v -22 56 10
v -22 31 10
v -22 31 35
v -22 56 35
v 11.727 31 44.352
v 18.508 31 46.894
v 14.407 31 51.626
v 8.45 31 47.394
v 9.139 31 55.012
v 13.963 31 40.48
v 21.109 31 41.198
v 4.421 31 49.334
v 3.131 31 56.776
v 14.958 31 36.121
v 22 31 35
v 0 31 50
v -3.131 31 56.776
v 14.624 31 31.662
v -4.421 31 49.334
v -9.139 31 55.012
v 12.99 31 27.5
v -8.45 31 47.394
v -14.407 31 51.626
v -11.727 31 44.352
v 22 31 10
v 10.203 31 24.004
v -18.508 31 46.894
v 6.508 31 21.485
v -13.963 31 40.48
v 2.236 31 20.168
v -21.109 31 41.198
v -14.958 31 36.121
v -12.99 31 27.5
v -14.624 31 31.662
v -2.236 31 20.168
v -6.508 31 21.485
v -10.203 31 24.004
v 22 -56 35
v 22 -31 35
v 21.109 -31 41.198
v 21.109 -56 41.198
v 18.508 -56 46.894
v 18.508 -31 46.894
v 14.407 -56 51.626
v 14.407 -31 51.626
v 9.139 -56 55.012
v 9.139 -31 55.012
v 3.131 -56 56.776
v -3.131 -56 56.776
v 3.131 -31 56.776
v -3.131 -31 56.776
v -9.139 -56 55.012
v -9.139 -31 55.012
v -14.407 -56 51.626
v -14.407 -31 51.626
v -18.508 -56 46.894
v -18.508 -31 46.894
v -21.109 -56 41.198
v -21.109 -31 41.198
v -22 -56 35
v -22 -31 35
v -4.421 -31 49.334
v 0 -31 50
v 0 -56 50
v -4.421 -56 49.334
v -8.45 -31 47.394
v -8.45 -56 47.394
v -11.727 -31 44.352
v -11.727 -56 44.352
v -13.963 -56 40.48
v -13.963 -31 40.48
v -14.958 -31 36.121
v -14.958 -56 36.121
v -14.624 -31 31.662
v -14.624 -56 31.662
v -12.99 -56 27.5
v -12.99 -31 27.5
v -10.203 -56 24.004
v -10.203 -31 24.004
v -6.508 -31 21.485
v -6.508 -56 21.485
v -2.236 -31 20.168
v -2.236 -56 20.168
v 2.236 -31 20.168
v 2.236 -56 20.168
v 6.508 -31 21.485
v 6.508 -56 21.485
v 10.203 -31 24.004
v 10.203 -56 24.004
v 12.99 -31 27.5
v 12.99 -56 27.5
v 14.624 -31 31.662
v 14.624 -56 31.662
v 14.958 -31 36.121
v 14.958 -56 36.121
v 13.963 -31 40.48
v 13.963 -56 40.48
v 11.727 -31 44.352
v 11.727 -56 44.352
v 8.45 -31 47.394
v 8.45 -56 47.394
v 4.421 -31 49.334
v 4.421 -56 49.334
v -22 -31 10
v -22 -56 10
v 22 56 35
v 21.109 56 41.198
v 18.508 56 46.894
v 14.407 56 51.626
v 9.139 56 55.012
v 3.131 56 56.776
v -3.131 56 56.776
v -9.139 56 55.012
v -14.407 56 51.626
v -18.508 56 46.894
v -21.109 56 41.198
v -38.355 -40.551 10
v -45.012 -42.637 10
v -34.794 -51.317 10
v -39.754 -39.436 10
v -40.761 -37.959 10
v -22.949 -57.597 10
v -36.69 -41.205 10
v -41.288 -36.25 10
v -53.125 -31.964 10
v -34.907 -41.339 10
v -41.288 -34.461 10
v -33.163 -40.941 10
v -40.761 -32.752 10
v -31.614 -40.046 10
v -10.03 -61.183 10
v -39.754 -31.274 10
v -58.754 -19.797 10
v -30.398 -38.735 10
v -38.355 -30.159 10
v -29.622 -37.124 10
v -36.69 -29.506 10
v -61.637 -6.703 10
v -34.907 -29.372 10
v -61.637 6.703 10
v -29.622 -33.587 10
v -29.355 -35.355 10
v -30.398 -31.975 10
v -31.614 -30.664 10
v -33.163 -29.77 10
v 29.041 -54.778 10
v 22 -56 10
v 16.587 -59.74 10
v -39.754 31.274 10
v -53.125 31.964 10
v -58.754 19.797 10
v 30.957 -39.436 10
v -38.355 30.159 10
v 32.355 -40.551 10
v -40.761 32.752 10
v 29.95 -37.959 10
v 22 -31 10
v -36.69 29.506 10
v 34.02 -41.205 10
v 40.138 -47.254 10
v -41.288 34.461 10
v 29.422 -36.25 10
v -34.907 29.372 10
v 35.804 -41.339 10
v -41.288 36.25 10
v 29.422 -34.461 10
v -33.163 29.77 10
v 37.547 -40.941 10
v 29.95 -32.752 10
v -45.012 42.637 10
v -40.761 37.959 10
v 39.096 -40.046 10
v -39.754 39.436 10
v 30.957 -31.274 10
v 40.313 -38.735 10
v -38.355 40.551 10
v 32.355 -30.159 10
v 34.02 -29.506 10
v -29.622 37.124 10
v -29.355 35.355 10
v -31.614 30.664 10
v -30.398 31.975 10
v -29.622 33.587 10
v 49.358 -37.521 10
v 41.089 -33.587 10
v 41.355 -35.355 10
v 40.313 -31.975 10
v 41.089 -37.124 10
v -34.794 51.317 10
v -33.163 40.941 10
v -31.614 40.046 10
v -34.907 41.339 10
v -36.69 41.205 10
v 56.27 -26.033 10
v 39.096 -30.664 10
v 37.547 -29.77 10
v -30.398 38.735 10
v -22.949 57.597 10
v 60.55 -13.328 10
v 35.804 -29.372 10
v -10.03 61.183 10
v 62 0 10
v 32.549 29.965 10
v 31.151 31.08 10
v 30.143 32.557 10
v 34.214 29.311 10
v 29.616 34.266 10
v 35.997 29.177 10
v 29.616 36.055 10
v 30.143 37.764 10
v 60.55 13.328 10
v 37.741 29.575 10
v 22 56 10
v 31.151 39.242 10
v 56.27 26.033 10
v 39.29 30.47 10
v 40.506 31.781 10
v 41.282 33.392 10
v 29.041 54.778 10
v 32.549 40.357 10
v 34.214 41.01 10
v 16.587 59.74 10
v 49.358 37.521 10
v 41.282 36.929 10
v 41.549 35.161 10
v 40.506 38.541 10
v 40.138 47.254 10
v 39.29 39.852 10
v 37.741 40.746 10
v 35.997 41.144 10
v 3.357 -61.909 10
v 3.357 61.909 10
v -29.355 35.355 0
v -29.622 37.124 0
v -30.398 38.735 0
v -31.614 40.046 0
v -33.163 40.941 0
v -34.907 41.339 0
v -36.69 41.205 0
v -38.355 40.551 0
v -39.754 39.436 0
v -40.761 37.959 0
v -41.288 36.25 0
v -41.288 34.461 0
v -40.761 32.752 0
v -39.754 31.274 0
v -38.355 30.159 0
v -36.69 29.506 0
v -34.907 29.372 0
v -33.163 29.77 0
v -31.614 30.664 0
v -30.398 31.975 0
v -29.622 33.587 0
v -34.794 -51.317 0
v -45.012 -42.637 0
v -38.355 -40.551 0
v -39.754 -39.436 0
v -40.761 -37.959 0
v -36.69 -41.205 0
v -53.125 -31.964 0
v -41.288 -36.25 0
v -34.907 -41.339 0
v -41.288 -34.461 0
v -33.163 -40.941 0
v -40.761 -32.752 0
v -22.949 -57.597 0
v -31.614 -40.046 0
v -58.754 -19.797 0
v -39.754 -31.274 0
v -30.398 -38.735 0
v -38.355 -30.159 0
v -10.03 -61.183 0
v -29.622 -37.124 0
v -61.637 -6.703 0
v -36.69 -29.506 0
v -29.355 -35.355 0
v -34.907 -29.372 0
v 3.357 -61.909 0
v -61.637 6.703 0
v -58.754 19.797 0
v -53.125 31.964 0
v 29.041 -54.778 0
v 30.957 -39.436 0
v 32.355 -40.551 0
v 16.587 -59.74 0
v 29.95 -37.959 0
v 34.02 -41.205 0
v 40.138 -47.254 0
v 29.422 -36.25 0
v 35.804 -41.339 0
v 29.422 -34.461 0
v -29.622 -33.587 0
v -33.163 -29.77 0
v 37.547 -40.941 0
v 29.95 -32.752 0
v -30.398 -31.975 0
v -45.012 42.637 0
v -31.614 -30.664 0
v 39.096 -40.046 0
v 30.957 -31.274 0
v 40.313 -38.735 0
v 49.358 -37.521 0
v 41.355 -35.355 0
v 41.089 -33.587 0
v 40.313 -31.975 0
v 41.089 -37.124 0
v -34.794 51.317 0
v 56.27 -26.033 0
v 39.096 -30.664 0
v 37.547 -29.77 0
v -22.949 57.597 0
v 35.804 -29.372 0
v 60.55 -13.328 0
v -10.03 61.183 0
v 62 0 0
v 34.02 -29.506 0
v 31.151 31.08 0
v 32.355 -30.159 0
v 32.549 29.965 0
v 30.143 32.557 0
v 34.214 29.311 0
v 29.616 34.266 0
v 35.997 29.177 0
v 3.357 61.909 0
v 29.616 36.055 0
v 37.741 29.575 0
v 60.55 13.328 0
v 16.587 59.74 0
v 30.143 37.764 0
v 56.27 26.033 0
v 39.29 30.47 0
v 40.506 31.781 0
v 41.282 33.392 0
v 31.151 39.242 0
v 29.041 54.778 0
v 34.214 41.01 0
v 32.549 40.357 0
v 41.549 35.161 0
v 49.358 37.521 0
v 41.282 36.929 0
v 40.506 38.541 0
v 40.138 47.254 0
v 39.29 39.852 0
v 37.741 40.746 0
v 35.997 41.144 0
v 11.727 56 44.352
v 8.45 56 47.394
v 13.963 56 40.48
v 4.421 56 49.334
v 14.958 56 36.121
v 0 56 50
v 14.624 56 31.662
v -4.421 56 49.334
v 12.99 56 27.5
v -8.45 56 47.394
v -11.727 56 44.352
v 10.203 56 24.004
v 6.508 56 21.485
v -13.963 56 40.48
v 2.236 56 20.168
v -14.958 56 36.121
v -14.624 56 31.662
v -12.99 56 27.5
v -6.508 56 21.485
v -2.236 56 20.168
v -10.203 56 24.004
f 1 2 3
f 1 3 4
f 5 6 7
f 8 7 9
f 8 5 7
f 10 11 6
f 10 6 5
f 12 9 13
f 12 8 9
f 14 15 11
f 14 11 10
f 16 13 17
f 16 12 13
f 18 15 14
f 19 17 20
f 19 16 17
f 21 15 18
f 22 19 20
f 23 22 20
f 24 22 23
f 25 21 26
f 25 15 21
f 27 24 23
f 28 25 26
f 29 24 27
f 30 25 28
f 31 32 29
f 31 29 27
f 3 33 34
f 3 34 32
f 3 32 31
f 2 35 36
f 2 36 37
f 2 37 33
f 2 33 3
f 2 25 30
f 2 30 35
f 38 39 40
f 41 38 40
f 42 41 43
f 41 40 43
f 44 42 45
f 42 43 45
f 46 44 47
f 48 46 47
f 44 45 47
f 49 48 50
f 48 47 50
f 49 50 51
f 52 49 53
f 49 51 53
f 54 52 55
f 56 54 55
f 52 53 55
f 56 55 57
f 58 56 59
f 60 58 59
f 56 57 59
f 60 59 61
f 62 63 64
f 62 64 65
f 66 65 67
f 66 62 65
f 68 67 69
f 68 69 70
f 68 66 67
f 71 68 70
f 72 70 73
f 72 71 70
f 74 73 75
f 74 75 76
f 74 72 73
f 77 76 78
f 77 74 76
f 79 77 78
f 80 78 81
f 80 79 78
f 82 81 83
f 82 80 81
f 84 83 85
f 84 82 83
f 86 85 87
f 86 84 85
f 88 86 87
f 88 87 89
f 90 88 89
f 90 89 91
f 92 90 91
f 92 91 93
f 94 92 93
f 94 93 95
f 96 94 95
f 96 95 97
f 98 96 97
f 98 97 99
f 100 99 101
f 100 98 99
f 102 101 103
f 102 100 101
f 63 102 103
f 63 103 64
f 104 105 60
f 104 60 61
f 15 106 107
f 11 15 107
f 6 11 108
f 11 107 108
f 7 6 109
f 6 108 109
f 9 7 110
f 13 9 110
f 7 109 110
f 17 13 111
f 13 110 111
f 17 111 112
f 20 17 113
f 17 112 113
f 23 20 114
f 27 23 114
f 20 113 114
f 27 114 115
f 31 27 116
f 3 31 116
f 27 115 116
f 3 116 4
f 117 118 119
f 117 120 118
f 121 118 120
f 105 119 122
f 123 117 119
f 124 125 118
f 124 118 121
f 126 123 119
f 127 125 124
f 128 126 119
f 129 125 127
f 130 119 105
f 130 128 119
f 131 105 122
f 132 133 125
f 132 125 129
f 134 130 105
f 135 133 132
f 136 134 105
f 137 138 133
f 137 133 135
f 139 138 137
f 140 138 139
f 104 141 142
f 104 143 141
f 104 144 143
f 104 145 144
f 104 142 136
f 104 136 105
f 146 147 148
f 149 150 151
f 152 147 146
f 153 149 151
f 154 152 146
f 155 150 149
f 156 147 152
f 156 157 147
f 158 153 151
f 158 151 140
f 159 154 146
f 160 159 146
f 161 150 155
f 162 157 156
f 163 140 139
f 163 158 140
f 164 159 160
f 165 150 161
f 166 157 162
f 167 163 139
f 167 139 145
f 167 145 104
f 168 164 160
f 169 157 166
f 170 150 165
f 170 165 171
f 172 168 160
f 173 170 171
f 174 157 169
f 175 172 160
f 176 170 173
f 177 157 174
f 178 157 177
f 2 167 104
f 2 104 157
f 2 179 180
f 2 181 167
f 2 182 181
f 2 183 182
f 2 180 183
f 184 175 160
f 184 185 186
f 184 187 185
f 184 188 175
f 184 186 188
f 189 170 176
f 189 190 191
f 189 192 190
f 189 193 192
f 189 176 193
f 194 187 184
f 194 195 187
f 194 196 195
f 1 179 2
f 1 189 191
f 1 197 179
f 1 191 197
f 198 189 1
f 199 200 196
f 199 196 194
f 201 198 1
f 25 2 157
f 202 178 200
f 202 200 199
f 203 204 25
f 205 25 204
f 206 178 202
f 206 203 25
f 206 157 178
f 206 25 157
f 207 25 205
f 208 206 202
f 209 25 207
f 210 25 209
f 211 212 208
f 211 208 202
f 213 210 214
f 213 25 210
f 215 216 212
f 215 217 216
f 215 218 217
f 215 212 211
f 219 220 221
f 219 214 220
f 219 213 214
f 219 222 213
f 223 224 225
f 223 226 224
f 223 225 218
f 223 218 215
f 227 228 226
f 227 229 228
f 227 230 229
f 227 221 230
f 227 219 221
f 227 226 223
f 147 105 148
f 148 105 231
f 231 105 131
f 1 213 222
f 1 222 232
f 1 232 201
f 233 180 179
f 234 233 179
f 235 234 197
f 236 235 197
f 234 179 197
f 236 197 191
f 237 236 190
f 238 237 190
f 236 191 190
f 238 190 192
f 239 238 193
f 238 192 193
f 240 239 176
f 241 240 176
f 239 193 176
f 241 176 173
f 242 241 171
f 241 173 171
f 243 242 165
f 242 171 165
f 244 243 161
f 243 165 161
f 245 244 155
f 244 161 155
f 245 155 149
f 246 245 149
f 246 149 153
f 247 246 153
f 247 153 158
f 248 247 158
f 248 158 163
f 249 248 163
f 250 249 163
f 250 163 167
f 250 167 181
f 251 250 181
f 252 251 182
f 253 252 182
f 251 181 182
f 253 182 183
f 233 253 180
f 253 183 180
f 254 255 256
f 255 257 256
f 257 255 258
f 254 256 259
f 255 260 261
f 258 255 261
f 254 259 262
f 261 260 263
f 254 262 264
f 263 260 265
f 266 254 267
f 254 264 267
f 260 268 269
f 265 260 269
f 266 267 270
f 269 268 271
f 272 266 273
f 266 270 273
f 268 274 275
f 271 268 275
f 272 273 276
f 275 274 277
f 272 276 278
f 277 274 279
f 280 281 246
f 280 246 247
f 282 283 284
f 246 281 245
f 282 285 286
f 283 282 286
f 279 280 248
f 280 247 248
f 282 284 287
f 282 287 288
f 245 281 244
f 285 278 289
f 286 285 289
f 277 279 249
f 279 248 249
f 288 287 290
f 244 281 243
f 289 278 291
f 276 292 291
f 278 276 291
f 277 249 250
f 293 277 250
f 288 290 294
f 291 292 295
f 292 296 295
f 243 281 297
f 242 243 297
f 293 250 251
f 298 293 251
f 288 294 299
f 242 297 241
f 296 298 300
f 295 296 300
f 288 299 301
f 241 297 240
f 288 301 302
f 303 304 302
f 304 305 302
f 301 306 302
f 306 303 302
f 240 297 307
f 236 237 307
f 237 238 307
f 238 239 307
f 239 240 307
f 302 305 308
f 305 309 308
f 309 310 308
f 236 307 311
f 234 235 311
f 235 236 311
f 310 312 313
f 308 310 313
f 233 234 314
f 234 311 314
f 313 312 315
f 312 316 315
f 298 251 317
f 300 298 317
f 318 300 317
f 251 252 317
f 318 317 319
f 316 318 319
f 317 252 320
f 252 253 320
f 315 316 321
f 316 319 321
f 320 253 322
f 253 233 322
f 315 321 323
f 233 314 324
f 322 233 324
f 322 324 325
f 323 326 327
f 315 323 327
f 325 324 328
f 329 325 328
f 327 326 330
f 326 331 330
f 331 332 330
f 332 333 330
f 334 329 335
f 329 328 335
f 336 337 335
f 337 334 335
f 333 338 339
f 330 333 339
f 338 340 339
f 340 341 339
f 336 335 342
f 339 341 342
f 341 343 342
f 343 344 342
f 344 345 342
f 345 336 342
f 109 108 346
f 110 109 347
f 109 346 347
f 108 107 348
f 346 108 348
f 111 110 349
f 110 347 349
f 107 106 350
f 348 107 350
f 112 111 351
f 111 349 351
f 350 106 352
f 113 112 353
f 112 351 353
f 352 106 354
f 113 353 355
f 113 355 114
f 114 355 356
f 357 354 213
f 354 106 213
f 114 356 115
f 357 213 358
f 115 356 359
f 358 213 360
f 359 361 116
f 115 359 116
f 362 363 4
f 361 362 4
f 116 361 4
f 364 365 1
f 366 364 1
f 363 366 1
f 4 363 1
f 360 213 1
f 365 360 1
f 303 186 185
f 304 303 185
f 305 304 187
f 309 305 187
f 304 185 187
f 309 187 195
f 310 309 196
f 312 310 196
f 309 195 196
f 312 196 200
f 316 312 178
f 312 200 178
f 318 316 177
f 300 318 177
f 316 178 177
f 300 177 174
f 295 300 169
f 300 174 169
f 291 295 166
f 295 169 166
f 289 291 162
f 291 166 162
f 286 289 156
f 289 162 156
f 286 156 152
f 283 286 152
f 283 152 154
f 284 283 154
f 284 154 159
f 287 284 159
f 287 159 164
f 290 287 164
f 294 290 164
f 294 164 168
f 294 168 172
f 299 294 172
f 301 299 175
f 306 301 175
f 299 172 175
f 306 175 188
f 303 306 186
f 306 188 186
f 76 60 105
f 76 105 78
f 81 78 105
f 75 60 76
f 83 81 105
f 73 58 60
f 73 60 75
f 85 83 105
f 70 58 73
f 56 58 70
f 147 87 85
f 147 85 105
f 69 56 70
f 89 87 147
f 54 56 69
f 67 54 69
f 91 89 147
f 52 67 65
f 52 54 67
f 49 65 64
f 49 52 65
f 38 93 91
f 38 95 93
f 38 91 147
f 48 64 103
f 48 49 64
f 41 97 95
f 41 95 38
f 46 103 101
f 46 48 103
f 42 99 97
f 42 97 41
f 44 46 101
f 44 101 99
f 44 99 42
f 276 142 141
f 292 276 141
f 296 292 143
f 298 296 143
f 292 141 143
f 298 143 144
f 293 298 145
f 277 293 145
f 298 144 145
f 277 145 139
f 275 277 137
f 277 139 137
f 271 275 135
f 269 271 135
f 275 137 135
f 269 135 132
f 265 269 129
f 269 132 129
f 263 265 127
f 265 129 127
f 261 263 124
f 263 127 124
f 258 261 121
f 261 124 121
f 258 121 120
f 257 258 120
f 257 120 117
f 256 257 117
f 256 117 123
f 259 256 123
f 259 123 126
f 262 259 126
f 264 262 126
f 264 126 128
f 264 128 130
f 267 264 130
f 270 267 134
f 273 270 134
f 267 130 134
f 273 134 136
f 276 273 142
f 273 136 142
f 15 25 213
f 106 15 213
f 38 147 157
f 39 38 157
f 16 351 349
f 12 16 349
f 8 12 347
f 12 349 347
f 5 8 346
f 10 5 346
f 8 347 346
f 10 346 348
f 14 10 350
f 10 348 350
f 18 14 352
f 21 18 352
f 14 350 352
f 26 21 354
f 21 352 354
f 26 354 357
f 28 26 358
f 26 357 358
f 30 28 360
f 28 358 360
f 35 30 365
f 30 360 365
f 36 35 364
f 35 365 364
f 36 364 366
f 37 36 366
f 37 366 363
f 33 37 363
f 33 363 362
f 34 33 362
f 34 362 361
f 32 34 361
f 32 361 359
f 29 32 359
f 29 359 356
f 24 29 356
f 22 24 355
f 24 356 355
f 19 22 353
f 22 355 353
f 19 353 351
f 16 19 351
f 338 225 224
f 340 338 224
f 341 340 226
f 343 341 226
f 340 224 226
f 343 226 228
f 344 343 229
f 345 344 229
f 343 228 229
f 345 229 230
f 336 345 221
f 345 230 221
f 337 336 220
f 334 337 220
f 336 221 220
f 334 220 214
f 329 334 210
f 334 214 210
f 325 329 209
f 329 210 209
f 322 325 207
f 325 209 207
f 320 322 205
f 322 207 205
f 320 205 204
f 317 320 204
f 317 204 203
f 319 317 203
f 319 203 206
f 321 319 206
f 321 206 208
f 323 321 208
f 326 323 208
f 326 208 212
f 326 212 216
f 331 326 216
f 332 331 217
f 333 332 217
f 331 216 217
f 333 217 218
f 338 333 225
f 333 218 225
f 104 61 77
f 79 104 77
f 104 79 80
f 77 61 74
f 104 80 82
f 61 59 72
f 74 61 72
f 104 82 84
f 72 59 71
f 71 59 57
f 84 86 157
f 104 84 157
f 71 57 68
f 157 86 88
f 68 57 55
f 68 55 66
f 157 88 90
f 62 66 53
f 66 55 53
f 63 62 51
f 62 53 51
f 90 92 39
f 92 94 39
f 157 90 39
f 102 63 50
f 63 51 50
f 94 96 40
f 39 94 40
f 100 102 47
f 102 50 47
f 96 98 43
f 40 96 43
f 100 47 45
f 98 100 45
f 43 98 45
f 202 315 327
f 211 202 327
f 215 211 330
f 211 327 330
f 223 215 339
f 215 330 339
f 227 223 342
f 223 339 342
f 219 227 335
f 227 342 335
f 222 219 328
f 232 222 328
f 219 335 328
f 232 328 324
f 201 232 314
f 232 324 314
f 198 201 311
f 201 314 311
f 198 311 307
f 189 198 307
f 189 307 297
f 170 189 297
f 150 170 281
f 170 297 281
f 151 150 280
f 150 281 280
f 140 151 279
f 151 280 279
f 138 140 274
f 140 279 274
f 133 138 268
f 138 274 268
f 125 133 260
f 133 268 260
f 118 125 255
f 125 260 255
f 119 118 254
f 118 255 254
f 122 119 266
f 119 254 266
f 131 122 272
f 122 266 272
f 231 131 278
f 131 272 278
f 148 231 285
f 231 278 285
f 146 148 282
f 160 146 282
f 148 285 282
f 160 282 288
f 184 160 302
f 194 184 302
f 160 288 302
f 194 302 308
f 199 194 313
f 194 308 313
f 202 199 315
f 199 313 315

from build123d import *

# Parameters (mm, degrees)
SKETCH1_R           = 62
BOSS_EXTRUDE1_DEPTH = 10
SKETCH2_R           = 6
CUT_EXTRUDE1_DEPTH  = 10
SKETCH4_W           = 44
SKETCH4_H           = 25
BOSS_EXTRUDE2_DEPTH = 25
BOSS_EXTRUDE5_DEPTH = 25
BOSS_EXTRUDE6_START = -25
BOSS_EXTRUDE6_DEPTH = 25
SKETCH9_R           = 15
CUT_EXTRUDE2_DEPTH  = 25
CUT_EXTRUDE3_START  = -25
SKETCH10_R          = 15
CUT_EXTRUDE3_DEPTH  = 25


with BuildPart() as part:
    # Sketch1 → Boss-Extrude1 (new body)
    with BuildSketch(Plane.XY):
        Circle(SKETCH1_R)
    extrude(amount=BOSS_EXTRUDE1_DEPTH)

    # Sketch2 → Cut-Extrude1 (cut)
    with BuildSketch(Plane.XY.offset(10)):
        with Locations((35.355339059, -35.355339059)):
            Circle(SKETCH2_R)
        with Locations((-35.355339059, -35.355339059)):
            Circle(SKETCH2_R)
        with Locations((-35.355339059, 35.355339059)):
            Circle(SKETCH2_R)
        with Locations((35.548908594, 35.160703886)):
            Circle(SKETCH2_R)
    extrude(amount=-CUT_EXTRUDE1_DEPTH, mode=Mode.SUBTRACT)

    # Sketch4 → Boss-Extrude2 (add)
    with BuildSketch(Plane.XY.offset(10)):
        with Locations((0, 43.5)):
            Rectangle(SKETCH4_W, SKETCH4_H)
        with Locations((0, -43.5)):
            Rectangle(SKETCH4_W, SKETCH4_H)
    extrude(amount=BOSS_EXTRUDE2_DEPTH)

    # Sketch5 → Boss-Extrude5 (add)
    with BuildSketch(Plane(origin=(0, 56, 0), x_dir=(1, 0, 0), z_dir=(0, 1, 0))):
        with BuildLine():
            Line((-22, -35), (22, -35))
            ThreePointArc((22, -35), (0, -57), (-22, -35))
        make_face()
    extrude(amount=-BOSS_EXTRUDE5_DEPTH)

    # Sketch8 → Boss-Extrude6 (add)
    with BuildSketch(Plane.XZ.offset(56).offset(BOSS_EXTRUDE6_START)):
        with BuildLine():
            Line((-22, 35), (22, 35))
            ThreePointArc((22, 35), (0, 57), (-22, 35))
        make_face()
    extrude(amount=BOSS_EXTRUDE6_DEPTH)

    # Sketch9 → Cut-Extrude2 (cut)
    with BuildSketch(Plane(origin=(0, 56, 0), x_dir=(1, 0, 0), z_dir=(0, 1, 0))):
        with Locations(Location((0, -35, 0), (0, 0, 270))):
            Circle(SKETCH9_R)
    extrude(amount=-CUT_EXTRUDE2_DEPTH, mode=Mode.SUBTRACT)

    # Sketch10 → Cut-Extrude3 (cut)
    with BuildSketch(Plane.XZ.offset(56).offset(CUT_EXTRUDE3_START)):
        with Locations(Location((0, 35, 0), (0, 0, 90))):
            Circle(SKETCH10_R)
    extrude(amount=CUT_EXTRUDE3_DEPTH, mode=Mode.SUBTRACT)


solid = part.part
